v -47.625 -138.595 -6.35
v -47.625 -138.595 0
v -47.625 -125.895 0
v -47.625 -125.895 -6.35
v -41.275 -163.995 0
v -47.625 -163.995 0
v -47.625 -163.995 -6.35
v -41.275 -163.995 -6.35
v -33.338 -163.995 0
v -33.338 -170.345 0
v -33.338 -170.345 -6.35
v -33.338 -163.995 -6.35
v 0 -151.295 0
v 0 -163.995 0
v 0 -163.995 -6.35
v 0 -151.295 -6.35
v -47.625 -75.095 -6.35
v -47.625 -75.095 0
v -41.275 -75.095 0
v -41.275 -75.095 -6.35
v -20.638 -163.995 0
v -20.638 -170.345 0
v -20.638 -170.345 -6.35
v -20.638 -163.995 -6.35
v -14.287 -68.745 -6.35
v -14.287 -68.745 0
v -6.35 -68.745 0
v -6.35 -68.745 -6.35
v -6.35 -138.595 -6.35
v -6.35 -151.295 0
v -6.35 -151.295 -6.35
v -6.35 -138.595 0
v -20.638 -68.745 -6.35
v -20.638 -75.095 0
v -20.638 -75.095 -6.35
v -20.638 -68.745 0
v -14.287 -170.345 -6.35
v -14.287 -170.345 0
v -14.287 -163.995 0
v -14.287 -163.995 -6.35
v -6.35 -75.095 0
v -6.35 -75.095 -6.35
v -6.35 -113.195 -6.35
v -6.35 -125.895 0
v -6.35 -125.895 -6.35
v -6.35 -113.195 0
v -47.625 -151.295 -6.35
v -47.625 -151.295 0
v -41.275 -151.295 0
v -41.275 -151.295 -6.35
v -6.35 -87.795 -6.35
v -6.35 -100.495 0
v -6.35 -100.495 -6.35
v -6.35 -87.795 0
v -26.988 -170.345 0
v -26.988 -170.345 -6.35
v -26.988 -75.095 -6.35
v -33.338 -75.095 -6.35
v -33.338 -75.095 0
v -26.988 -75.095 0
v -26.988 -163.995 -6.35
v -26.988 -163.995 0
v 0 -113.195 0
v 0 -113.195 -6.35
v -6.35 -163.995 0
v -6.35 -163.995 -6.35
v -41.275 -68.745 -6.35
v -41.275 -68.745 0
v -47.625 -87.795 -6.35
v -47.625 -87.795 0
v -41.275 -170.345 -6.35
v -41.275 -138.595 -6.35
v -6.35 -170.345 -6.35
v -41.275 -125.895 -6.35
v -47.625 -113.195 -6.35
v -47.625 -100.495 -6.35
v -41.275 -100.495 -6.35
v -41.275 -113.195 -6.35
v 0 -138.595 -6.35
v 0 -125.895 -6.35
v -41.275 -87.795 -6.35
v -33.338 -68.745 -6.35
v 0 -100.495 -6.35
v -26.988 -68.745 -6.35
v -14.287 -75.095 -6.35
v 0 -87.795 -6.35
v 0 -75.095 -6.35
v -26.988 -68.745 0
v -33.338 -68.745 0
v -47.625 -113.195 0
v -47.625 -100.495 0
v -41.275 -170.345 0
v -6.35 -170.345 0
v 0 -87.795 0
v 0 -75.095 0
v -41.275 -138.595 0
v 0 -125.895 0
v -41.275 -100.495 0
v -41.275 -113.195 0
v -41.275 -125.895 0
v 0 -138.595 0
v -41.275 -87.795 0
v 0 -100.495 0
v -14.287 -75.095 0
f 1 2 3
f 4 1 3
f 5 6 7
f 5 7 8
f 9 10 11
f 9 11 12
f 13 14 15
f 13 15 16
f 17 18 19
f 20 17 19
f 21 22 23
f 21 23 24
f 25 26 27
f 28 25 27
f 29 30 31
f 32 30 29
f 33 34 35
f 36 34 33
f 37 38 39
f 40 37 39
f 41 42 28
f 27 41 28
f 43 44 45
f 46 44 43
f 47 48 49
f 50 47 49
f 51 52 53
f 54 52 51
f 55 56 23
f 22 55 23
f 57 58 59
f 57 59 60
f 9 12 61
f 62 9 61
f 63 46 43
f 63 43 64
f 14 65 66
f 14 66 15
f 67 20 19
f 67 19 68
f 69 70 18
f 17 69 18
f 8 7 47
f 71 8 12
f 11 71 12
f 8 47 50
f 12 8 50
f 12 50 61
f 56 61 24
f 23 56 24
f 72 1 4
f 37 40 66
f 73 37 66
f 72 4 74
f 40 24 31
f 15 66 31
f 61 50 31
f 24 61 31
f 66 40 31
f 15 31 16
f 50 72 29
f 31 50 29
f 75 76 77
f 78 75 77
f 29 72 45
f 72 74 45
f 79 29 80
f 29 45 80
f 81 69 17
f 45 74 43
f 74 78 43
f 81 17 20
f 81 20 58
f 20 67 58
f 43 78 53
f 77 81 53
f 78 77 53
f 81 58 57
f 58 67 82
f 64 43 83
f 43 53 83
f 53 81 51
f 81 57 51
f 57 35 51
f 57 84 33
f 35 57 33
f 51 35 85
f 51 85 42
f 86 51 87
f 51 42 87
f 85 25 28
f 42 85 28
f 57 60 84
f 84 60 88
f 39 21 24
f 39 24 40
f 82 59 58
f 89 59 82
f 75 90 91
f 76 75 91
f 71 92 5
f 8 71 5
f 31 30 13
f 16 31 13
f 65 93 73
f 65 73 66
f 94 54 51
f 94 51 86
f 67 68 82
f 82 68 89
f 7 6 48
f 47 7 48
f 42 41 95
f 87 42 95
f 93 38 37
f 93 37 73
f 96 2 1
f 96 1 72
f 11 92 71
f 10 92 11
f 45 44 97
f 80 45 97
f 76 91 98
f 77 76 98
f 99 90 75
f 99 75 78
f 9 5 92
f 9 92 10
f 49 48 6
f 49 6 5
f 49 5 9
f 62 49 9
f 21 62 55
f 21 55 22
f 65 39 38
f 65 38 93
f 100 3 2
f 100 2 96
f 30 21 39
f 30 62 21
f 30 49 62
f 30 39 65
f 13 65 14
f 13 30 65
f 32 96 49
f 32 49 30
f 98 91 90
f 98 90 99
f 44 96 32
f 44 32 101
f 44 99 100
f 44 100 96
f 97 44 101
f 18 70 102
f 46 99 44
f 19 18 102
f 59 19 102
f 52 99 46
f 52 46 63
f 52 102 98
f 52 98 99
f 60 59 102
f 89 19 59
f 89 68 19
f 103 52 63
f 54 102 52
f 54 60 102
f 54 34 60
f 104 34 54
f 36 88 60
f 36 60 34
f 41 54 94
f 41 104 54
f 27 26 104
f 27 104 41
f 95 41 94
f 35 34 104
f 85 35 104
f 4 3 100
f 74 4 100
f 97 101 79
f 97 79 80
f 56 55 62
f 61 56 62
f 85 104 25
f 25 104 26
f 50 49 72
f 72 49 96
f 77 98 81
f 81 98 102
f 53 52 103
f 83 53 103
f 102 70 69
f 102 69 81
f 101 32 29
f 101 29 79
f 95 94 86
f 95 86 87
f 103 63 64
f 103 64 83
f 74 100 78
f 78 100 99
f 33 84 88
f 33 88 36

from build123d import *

# Parameters (mm, degrees)
SKETCH1_W           = 47.625
SKETCH1_H           = 101.6
BOSS_EXTRUDE1_DEPTH = 6.35
SKETCH4_W           = 12.7
SKETCH4_H           = 12.7
CUT_EXTRUDE1_DEPTH  = 177.991271514
LPATTERN1_COUNT     = 3
LPATTERN1_PITCH     = 25.4
LPATTERN1_COL_COUNT = 3
LPATTERN1_COL_PITCH = 25.4
SKETCH3_W           = 6.35
SKETCH3_H           = 12.7
CUT_EXTRUDE2_DEPTH  = 177.991271514


with BuildPart() as part:
    # Sketch1 → Boss-Extrude1 (new body)
    with BuildSketch(Plane.XY):
        with Locations((-23.8125, -119.54508231)):
            Rectangle(SKETCH1_W, SKETCH1_H)
    extrude(amount=-BOSS_EXTRUDE1_DEPTH)

    # Sketch4 → Cut-Extrude1 (cut, through all)
    with BuildSketch(Plane.XY):
        with Locations((0, -119.54508231)):
            Rectangle(SKETCH4_W, SKETCH4_H)
        with Locations((-47.625, -119.54508231)):
            Rectangle(SKETCH4_W, SKETCH4_H)
    cut_extrude1 = extrude(amount=-CUT_EXTRUDE1_DEPTH, mode=Mode.SUBTRACT)

    # LPattern1: Cut-Extrude1 ×3
    with Locations(*[(0, -i * LPATTERN1_PITCH, 0) for i in range(1, LPATTERN1_COUNT)]):
        add(cut_extrude1, mode=Mode.SUBTRACT)

    # LPattern1 col: Cut-Extrude1 ×3
    with Locations(*[(0, i * LPATTERN1_COL_PITCH, 0) for i in range(1, LPATTERN1_COL_COUNT)]):
        add(cut_extrude1, mode=Mode.SUBTRACT)

    # Sketch3 → Cut-Extrude2 (cut, through all)
    with BuildSketch(Plane.XY):
        with Locations((-17.4625, -68.74508231)):
            Rectangle(SKETCH3_W, SKETCH3_H)
        with Locations((-30.1625, -68.74508231)):
            Rectangle(SKETCH3_W, SKETCH3_H)
        with Locations((-30.1625, -170.34508231)):
            Rectangle(SKETCH3_W, SKETCH3_H)
        with Locations((-17.4625, -170.34508231)):
            Rectangle(SKETCH3_W, SKETCH3_H)
    extrude(amount=-CUT_EXTRUDE2_DEPTH, mode=Mode.SUBTRACT)


solid = part.part
